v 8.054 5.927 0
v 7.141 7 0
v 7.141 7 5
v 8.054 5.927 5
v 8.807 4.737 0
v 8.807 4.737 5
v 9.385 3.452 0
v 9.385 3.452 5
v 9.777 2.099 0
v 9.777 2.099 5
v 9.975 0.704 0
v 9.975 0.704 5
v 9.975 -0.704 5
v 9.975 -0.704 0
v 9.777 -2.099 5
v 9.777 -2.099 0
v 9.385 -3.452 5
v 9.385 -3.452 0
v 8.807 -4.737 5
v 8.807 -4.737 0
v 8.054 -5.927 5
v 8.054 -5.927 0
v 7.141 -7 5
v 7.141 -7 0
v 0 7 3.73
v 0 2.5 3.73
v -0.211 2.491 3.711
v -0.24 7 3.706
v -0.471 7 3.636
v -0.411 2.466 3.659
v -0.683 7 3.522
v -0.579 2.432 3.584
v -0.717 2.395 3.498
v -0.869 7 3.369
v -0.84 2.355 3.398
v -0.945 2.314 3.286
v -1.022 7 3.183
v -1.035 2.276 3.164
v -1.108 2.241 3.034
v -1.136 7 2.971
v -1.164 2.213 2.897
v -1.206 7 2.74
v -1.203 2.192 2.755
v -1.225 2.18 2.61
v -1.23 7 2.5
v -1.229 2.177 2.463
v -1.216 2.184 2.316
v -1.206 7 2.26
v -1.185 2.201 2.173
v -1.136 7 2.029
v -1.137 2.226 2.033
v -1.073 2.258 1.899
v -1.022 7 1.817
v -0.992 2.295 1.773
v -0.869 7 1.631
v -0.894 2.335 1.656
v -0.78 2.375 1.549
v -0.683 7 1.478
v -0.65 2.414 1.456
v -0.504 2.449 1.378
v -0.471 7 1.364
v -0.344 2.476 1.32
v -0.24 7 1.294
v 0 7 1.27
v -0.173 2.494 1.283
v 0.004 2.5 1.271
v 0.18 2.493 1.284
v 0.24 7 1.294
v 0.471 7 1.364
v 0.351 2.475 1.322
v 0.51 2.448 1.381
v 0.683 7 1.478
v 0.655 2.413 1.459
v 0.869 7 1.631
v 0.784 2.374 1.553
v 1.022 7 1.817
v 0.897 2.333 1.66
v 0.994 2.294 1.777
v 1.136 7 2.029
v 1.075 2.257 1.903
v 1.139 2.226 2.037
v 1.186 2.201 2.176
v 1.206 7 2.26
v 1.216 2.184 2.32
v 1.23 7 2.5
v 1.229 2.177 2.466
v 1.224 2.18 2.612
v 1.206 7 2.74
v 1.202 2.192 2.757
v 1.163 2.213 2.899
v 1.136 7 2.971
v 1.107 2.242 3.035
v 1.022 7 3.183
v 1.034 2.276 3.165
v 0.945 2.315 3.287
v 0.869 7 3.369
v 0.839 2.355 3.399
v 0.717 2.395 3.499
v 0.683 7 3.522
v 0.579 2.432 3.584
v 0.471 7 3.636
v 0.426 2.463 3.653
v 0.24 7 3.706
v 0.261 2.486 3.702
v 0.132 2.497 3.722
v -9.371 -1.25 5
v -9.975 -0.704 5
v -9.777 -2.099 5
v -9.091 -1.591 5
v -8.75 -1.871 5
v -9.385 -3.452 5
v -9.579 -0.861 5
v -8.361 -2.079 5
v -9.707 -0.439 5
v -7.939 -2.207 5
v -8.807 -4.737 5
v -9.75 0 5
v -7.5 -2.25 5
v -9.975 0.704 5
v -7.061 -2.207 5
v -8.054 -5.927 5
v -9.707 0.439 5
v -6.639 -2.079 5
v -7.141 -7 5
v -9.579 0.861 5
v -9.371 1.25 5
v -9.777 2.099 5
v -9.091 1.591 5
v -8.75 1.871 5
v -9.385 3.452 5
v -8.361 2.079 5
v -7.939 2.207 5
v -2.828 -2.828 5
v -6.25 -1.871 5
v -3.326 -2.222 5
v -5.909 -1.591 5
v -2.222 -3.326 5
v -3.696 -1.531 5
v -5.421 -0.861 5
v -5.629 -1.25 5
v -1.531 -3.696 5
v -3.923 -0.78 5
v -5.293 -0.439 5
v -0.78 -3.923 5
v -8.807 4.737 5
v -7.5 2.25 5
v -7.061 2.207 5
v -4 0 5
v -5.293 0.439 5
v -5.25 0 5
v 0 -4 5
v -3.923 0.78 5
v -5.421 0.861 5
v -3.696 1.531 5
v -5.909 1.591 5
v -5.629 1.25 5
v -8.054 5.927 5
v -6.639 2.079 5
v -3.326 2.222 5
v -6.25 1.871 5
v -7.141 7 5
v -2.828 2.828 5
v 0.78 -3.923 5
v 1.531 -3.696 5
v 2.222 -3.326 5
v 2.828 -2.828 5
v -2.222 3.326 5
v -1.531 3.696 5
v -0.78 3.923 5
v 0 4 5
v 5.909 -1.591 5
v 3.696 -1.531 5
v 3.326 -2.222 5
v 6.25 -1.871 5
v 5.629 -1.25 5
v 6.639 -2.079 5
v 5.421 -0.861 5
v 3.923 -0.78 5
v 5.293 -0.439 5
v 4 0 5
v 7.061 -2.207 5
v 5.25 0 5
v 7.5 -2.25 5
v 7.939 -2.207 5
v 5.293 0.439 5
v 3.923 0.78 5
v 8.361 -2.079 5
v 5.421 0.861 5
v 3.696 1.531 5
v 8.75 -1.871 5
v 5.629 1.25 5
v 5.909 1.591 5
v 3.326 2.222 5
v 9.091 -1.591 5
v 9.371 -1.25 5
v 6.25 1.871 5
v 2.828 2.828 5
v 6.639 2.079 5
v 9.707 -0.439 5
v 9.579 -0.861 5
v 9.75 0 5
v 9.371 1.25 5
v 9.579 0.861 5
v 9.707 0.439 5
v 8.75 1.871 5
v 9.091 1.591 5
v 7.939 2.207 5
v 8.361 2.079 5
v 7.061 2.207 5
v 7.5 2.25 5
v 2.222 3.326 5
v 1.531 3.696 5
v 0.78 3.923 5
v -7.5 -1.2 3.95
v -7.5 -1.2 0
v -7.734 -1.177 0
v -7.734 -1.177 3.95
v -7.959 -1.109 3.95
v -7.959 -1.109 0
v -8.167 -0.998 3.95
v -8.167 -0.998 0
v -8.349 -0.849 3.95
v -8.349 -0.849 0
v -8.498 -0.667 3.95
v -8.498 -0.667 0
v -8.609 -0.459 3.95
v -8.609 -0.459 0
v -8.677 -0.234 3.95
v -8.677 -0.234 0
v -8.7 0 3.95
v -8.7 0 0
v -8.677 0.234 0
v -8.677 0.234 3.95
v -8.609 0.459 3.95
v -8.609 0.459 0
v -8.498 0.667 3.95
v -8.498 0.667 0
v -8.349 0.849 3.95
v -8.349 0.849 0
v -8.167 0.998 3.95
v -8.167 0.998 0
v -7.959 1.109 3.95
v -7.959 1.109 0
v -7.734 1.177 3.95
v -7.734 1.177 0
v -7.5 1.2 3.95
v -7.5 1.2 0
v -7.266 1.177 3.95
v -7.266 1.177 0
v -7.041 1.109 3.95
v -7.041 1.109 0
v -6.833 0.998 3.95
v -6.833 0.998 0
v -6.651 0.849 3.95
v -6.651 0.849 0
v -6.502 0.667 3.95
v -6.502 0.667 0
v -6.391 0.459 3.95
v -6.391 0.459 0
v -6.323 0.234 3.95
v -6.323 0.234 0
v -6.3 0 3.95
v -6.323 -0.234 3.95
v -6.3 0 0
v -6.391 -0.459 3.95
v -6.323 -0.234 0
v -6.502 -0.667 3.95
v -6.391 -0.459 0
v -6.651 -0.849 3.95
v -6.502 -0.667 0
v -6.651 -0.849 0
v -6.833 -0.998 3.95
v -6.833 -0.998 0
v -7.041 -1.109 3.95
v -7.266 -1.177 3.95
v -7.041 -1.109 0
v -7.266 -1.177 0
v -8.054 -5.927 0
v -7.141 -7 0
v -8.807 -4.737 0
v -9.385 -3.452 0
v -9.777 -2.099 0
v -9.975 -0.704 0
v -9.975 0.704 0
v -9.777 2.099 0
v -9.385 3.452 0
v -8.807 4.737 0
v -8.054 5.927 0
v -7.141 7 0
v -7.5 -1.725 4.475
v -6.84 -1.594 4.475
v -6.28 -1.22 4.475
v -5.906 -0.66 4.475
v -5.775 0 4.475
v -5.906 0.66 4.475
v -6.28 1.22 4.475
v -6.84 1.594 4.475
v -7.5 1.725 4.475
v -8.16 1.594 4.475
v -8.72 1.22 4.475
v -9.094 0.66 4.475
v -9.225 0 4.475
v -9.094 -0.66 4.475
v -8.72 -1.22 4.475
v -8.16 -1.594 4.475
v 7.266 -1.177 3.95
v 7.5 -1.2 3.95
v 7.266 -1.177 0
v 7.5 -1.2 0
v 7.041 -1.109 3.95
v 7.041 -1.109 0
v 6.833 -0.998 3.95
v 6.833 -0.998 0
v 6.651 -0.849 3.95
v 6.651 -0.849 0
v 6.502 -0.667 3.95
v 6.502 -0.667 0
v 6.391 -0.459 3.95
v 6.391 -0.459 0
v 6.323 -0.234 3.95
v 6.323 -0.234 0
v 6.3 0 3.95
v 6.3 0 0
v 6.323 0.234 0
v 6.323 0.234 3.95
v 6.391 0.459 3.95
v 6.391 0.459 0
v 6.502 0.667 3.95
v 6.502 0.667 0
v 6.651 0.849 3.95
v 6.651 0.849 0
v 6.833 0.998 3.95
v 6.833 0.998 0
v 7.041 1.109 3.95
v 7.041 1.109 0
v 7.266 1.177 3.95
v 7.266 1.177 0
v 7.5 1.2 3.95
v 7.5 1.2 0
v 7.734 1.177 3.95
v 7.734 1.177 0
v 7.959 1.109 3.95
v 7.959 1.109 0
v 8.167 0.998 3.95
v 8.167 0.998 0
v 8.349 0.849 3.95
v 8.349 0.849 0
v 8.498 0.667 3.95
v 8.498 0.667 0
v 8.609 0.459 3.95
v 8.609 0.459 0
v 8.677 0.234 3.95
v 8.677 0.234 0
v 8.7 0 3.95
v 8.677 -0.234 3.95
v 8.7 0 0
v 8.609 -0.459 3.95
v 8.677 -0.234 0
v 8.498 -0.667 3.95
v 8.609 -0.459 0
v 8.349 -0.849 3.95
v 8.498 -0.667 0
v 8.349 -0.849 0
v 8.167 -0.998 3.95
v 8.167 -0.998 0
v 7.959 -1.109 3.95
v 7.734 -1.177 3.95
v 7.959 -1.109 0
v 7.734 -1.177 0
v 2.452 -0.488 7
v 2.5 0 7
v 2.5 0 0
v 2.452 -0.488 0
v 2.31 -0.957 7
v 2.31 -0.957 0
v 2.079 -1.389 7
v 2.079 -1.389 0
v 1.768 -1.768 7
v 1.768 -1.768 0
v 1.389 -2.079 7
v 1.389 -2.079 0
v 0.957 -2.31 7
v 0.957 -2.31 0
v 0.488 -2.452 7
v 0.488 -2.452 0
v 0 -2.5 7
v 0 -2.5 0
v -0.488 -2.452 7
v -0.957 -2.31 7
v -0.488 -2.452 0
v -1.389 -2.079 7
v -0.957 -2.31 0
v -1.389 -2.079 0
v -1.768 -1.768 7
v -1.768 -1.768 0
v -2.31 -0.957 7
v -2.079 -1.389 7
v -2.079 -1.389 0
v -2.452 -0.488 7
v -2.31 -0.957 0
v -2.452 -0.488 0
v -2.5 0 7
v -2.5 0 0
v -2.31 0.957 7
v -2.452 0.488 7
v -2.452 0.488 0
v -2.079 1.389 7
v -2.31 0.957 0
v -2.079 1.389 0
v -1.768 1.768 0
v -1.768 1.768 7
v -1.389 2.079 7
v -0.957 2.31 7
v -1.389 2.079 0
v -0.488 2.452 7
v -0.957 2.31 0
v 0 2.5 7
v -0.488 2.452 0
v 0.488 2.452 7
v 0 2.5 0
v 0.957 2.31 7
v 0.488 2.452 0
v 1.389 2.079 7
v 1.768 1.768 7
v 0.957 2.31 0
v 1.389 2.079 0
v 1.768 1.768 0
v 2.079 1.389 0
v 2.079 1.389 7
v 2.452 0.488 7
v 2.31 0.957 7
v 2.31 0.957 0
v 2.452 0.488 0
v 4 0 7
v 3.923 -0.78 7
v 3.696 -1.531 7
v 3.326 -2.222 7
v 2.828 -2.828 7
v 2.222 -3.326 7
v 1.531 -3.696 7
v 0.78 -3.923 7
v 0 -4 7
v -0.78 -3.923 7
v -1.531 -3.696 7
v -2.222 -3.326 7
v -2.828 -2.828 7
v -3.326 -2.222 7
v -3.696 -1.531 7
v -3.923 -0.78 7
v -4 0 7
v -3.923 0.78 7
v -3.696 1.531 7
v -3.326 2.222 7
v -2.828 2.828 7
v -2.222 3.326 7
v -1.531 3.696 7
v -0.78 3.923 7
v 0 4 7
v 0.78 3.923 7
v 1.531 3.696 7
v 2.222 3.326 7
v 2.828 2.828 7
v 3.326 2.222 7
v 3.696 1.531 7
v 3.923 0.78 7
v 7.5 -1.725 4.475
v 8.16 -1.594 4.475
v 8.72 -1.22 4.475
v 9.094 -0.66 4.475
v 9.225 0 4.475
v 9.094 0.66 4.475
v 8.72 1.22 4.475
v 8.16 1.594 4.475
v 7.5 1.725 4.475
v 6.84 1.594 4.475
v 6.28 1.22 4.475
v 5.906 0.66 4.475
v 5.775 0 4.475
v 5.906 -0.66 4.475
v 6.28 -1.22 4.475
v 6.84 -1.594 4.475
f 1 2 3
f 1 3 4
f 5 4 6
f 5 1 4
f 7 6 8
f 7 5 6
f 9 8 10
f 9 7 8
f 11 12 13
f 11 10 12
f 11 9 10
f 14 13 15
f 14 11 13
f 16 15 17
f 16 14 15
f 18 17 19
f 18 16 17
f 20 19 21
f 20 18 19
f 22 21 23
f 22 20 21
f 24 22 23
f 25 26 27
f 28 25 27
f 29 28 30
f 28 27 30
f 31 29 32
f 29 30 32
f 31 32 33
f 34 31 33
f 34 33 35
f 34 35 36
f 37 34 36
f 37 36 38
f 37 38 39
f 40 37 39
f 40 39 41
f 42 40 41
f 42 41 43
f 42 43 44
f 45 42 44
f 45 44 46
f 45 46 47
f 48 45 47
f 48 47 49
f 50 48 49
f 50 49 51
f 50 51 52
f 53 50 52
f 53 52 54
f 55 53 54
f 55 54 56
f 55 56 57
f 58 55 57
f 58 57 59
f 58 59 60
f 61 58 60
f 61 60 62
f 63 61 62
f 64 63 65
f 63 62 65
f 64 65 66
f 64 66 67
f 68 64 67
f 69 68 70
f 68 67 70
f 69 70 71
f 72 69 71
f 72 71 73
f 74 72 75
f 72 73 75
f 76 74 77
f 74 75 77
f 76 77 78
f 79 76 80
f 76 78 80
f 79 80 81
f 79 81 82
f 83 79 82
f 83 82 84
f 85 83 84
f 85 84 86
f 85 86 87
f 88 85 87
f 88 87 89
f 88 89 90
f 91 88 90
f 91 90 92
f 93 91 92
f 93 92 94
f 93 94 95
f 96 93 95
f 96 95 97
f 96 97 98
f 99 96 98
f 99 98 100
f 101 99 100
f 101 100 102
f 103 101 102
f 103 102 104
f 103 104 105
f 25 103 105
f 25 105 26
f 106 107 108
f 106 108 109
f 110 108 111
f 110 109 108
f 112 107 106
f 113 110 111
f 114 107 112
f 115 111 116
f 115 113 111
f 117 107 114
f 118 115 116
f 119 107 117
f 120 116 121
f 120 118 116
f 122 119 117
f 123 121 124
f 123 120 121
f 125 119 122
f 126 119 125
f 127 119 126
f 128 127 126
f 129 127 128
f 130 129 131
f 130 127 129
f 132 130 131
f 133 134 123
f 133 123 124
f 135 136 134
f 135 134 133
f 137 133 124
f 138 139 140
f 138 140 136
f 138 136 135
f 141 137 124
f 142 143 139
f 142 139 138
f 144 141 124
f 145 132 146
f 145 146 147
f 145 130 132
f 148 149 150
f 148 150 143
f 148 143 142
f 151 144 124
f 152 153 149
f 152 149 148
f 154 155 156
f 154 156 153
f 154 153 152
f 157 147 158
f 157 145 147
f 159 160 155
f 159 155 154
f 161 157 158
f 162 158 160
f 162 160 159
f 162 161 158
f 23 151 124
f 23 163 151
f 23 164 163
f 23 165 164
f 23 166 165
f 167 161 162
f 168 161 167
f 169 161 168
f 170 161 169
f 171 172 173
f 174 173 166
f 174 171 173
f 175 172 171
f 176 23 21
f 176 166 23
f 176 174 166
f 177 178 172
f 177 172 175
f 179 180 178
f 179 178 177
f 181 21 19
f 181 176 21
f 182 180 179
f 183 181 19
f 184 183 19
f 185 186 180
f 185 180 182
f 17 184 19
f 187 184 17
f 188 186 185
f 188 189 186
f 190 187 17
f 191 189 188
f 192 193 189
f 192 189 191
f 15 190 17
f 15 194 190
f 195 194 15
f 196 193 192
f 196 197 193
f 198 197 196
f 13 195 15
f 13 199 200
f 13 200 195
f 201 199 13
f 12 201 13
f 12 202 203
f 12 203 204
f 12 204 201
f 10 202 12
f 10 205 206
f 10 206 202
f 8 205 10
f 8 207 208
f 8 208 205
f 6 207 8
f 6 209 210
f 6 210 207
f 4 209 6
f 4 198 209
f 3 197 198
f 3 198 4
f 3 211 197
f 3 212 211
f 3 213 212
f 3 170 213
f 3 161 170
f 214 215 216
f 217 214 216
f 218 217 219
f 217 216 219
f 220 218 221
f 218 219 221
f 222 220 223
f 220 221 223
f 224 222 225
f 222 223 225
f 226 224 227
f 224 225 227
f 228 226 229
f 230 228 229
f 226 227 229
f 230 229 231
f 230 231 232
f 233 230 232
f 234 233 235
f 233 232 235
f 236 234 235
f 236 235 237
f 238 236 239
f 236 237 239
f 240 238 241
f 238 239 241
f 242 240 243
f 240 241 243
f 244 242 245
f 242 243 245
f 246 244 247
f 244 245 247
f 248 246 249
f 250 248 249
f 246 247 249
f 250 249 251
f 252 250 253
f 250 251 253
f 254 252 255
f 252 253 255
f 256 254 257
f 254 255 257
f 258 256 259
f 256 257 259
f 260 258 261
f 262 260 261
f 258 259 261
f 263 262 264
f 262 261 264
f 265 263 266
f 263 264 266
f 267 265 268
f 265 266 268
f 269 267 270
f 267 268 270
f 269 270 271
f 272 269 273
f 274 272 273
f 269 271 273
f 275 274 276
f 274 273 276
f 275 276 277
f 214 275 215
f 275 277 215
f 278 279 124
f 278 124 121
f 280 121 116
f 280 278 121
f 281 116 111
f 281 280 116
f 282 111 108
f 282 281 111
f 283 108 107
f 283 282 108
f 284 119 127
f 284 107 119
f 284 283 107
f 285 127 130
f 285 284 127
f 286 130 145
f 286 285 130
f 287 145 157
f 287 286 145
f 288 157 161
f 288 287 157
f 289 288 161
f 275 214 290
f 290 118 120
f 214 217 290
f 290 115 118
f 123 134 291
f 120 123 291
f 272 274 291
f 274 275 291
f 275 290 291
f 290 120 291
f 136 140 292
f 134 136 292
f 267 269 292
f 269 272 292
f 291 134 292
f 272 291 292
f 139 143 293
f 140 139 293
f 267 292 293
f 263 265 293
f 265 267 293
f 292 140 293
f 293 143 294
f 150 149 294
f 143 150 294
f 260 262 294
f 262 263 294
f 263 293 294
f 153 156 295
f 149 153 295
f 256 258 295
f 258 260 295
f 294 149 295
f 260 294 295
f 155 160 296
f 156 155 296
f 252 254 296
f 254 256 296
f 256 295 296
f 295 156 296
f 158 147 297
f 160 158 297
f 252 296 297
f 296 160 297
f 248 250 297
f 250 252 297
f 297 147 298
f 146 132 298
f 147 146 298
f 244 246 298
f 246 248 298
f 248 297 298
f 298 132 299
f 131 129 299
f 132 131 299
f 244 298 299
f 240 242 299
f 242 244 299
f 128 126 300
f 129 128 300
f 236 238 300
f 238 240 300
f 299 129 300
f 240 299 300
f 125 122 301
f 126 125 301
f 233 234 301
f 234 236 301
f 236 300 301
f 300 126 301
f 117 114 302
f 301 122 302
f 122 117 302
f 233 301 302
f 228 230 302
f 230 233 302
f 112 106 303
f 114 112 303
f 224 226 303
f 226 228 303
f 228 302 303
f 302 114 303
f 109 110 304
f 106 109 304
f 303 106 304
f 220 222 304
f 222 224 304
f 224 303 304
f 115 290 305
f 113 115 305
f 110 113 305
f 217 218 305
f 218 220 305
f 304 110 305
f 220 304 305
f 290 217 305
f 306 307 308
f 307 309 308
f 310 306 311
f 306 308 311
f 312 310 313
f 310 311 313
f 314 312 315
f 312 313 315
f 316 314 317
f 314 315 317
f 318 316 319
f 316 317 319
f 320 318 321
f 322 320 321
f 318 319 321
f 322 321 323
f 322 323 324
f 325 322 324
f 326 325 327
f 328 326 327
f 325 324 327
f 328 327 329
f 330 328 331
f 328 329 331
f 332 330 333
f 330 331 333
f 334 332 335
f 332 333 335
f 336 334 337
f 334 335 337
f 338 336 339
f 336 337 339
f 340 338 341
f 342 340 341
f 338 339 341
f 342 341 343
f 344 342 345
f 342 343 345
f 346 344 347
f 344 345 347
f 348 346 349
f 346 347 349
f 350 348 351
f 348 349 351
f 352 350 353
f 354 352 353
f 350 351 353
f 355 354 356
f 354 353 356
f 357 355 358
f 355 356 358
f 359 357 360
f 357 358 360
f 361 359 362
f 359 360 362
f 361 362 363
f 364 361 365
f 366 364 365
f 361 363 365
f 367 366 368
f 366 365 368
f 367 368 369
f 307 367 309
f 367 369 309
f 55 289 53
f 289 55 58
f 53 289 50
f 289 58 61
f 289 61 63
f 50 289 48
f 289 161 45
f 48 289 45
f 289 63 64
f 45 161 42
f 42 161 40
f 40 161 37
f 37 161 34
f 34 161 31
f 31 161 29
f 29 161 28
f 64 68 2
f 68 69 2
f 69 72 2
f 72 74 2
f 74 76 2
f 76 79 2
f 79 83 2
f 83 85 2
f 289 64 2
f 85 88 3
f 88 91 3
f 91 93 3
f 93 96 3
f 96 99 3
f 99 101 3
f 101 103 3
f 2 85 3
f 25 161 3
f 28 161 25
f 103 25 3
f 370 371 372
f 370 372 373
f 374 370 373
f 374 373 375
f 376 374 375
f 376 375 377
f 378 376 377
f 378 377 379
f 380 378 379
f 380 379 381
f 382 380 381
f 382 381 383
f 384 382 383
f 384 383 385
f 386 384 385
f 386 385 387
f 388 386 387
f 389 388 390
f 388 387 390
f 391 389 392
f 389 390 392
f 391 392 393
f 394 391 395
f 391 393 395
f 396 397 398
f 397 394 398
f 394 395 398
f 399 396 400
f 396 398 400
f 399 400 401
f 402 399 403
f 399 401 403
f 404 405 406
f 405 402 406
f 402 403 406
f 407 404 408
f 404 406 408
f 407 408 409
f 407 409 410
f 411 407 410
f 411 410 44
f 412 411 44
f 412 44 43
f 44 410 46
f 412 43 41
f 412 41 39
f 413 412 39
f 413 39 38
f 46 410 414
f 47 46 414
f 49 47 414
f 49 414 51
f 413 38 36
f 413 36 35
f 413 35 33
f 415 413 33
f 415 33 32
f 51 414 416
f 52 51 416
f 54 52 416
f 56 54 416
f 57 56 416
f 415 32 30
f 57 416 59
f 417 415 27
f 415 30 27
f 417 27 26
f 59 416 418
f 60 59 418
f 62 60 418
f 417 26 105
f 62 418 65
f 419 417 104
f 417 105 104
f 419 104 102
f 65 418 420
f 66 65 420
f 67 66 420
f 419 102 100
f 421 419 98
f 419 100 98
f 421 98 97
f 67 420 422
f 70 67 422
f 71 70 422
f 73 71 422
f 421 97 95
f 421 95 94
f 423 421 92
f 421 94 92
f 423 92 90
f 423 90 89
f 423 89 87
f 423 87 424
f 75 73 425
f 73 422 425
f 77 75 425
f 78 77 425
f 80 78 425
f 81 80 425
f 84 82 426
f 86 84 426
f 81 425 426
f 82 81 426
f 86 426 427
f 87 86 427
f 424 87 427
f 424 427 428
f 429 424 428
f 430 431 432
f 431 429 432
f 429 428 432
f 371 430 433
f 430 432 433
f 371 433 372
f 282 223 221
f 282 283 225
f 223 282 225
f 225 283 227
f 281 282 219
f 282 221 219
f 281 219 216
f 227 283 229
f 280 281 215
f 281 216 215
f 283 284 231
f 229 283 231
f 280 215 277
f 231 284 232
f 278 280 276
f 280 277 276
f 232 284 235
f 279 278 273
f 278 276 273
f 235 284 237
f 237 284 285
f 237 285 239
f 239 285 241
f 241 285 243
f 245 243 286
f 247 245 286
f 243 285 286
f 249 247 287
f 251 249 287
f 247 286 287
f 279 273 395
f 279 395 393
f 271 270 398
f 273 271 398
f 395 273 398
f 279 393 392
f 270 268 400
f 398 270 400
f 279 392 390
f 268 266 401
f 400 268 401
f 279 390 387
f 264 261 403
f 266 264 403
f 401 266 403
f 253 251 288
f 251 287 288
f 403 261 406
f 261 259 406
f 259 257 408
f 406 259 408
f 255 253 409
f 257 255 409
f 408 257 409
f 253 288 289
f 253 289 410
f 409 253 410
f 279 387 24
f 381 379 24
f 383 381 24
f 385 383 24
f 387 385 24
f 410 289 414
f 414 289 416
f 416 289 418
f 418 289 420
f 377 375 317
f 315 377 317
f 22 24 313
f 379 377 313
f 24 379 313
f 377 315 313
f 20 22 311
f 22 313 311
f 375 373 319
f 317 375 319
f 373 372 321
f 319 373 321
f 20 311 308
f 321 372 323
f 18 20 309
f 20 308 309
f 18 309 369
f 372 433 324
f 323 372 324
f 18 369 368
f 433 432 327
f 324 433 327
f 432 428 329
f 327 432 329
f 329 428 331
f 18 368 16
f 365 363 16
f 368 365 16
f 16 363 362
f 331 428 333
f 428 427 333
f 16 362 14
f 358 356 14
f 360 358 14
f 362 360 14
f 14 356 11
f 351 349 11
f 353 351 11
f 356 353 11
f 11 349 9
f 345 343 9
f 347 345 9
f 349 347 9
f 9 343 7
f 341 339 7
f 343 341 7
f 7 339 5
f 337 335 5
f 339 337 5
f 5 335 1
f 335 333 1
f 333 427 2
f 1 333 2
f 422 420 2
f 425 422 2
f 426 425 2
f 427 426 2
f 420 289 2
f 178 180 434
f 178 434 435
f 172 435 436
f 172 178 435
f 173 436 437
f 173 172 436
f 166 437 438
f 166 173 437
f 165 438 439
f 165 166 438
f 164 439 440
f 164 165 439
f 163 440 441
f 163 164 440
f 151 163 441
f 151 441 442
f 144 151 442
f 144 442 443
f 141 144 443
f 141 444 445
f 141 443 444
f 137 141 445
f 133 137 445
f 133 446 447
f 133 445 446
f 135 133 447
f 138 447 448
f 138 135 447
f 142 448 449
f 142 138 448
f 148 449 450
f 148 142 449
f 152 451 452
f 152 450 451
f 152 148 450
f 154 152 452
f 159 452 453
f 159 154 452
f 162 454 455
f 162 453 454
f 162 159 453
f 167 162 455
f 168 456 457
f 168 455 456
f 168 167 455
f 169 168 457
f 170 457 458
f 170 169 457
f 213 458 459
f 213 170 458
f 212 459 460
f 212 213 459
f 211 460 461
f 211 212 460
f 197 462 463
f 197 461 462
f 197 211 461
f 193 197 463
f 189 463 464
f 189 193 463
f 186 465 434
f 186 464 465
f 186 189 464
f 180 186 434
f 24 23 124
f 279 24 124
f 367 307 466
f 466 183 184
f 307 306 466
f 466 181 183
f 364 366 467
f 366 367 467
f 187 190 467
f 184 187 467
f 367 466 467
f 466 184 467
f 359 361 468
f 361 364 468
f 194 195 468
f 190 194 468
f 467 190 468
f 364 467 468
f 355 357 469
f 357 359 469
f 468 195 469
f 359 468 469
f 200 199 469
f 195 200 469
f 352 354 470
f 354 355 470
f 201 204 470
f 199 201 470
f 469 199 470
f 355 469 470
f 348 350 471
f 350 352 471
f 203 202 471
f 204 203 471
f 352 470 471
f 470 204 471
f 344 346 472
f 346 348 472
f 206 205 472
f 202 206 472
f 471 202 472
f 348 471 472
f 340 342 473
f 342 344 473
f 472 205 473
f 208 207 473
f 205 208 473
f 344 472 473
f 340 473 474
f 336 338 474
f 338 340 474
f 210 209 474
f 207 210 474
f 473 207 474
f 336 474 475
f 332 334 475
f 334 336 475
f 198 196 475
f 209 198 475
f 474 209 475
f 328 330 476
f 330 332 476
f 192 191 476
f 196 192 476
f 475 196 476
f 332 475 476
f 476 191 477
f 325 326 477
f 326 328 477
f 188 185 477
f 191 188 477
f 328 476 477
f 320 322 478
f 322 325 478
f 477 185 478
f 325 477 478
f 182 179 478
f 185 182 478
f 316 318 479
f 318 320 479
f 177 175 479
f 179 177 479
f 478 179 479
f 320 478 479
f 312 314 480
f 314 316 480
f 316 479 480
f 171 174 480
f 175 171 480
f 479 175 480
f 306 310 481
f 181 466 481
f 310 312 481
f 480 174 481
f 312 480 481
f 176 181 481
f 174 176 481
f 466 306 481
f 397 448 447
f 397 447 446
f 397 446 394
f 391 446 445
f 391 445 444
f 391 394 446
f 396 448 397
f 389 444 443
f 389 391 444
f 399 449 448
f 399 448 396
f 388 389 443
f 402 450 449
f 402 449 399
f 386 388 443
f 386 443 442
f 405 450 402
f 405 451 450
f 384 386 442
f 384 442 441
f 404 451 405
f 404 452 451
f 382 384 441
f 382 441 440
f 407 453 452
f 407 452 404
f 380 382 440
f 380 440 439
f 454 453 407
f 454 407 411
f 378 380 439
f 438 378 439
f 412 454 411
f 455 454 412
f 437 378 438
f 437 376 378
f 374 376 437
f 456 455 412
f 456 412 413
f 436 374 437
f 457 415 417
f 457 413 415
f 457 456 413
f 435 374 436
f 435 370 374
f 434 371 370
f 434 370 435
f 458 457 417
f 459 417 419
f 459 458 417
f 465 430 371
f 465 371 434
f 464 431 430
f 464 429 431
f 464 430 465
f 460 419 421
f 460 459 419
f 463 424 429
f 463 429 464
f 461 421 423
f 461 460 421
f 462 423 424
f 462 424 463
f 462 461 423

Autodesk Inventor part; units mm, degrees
ref_plane "YZ Plane" through (0, 0, 0) normal (1, 0, 0) x (0, 1, 0)
ref_plane "XZ Plane" through (0, 0, 0) normal (0, 1, 0) x (-1, 0, 0)
ref_plane "XY Plane" through (0, 0, 0) normal (0, 0, 1) x (1, 0, 0)
sketch "Skizze1" plane through (0, 0, 0) normal (0, 0, 1) x (1, 0, 0)
  line L0 (-14, 0) -> (14, 0) projected
  line L1 (0, -14) -> (0, 14) projected
  circle A0 centre (0, 0) radius 10
  circle A1 centre (0, 0) radius 2.5
  dimension "d0" = 5
  dimension "d1" = 20
extrude "Extrusion1" add sketch "Skizze1" along normal blind 5 contours A1 L1 A0 L0 | L0 A0 L1 A1 | A1 L0 A0 L1 | L1 A0 L0 A1
sketch "Skizze2" plane through (0, 0, 5) normal (0, 0, 1) x (1, 0, 0)
  circle A0 centre (0, 0) radius 10 projected
  line L0 (-14, 0) -> (14, 0) projected
  line L1 (0, -14) -> (0, 14) projected
  line L2 (-7.1414, 7) -> (7.1414, 7)
  line L3 (7.1414, -7) -> (-7.1414, -7)
  dimension "d4" = 14
extrude "Extrusion2" cut sketch "Skizze2" against normal through all contours L2 L1 A0 | A0 L1 L3 | L1 L2 A0 | A0 L3 L1
sketch "Skizze3" plane through (-7.1414, 7, 5) normal (0, 1, 0) x (1, 0, 0)
  line L0 (0, 5) -> (14.2829, 5) projected
  line L1 (-6.8586, 5) -> (21.1414, 5) projected
  line L2 (7.1414, 6) -> (7.1414, -1) projected
  point P0 (7.1414, 5)
  point P1 (7.1414, 2.5)
  dimension "d7" = 2.5
hole "Bohrung1" at (0, 7, 2.5) direction (0, -1, 0) diameter 2.459 end up to surface thread size "M3x0.5" class "6H" standard "ISO Metric profile"
sketch "Skizze4" plane through (0, 0, 5) normal (0, 0, 1) x (1, 0, 0)
  circle A0 centre (0, 0) radius 2.5 projected
  line L0 (-14, 0) -> (14, 0) projected
  line L1 (0, -14) -> (0, 14) projected
  circle A1 centre (0, 0) radius 7.5
  point P0 (-7.5, 0)
  point P1 (7.5, 0)
  dimension "d15" = 15
hole "Bohrung2" at (-7.5, 0, 5) at (7.5, 0, 5) direction (0, 0, -1) diameter 2.4 end through all countersink diameter 4.5 countersink angle 90
sketch "Skizze5" plane through (0, 0, 5) normal (0, 0, 1) x (1, 0, 0)
  circle A0 centre (0, 0) radius 2.5 projected
  circle A1 centre (0, 0) radius 4
  dimension "d23" = 8
extrude "Extrusion3" add sketch "Skizze5" along normal blind 2
properties part number "13_1087_028"
